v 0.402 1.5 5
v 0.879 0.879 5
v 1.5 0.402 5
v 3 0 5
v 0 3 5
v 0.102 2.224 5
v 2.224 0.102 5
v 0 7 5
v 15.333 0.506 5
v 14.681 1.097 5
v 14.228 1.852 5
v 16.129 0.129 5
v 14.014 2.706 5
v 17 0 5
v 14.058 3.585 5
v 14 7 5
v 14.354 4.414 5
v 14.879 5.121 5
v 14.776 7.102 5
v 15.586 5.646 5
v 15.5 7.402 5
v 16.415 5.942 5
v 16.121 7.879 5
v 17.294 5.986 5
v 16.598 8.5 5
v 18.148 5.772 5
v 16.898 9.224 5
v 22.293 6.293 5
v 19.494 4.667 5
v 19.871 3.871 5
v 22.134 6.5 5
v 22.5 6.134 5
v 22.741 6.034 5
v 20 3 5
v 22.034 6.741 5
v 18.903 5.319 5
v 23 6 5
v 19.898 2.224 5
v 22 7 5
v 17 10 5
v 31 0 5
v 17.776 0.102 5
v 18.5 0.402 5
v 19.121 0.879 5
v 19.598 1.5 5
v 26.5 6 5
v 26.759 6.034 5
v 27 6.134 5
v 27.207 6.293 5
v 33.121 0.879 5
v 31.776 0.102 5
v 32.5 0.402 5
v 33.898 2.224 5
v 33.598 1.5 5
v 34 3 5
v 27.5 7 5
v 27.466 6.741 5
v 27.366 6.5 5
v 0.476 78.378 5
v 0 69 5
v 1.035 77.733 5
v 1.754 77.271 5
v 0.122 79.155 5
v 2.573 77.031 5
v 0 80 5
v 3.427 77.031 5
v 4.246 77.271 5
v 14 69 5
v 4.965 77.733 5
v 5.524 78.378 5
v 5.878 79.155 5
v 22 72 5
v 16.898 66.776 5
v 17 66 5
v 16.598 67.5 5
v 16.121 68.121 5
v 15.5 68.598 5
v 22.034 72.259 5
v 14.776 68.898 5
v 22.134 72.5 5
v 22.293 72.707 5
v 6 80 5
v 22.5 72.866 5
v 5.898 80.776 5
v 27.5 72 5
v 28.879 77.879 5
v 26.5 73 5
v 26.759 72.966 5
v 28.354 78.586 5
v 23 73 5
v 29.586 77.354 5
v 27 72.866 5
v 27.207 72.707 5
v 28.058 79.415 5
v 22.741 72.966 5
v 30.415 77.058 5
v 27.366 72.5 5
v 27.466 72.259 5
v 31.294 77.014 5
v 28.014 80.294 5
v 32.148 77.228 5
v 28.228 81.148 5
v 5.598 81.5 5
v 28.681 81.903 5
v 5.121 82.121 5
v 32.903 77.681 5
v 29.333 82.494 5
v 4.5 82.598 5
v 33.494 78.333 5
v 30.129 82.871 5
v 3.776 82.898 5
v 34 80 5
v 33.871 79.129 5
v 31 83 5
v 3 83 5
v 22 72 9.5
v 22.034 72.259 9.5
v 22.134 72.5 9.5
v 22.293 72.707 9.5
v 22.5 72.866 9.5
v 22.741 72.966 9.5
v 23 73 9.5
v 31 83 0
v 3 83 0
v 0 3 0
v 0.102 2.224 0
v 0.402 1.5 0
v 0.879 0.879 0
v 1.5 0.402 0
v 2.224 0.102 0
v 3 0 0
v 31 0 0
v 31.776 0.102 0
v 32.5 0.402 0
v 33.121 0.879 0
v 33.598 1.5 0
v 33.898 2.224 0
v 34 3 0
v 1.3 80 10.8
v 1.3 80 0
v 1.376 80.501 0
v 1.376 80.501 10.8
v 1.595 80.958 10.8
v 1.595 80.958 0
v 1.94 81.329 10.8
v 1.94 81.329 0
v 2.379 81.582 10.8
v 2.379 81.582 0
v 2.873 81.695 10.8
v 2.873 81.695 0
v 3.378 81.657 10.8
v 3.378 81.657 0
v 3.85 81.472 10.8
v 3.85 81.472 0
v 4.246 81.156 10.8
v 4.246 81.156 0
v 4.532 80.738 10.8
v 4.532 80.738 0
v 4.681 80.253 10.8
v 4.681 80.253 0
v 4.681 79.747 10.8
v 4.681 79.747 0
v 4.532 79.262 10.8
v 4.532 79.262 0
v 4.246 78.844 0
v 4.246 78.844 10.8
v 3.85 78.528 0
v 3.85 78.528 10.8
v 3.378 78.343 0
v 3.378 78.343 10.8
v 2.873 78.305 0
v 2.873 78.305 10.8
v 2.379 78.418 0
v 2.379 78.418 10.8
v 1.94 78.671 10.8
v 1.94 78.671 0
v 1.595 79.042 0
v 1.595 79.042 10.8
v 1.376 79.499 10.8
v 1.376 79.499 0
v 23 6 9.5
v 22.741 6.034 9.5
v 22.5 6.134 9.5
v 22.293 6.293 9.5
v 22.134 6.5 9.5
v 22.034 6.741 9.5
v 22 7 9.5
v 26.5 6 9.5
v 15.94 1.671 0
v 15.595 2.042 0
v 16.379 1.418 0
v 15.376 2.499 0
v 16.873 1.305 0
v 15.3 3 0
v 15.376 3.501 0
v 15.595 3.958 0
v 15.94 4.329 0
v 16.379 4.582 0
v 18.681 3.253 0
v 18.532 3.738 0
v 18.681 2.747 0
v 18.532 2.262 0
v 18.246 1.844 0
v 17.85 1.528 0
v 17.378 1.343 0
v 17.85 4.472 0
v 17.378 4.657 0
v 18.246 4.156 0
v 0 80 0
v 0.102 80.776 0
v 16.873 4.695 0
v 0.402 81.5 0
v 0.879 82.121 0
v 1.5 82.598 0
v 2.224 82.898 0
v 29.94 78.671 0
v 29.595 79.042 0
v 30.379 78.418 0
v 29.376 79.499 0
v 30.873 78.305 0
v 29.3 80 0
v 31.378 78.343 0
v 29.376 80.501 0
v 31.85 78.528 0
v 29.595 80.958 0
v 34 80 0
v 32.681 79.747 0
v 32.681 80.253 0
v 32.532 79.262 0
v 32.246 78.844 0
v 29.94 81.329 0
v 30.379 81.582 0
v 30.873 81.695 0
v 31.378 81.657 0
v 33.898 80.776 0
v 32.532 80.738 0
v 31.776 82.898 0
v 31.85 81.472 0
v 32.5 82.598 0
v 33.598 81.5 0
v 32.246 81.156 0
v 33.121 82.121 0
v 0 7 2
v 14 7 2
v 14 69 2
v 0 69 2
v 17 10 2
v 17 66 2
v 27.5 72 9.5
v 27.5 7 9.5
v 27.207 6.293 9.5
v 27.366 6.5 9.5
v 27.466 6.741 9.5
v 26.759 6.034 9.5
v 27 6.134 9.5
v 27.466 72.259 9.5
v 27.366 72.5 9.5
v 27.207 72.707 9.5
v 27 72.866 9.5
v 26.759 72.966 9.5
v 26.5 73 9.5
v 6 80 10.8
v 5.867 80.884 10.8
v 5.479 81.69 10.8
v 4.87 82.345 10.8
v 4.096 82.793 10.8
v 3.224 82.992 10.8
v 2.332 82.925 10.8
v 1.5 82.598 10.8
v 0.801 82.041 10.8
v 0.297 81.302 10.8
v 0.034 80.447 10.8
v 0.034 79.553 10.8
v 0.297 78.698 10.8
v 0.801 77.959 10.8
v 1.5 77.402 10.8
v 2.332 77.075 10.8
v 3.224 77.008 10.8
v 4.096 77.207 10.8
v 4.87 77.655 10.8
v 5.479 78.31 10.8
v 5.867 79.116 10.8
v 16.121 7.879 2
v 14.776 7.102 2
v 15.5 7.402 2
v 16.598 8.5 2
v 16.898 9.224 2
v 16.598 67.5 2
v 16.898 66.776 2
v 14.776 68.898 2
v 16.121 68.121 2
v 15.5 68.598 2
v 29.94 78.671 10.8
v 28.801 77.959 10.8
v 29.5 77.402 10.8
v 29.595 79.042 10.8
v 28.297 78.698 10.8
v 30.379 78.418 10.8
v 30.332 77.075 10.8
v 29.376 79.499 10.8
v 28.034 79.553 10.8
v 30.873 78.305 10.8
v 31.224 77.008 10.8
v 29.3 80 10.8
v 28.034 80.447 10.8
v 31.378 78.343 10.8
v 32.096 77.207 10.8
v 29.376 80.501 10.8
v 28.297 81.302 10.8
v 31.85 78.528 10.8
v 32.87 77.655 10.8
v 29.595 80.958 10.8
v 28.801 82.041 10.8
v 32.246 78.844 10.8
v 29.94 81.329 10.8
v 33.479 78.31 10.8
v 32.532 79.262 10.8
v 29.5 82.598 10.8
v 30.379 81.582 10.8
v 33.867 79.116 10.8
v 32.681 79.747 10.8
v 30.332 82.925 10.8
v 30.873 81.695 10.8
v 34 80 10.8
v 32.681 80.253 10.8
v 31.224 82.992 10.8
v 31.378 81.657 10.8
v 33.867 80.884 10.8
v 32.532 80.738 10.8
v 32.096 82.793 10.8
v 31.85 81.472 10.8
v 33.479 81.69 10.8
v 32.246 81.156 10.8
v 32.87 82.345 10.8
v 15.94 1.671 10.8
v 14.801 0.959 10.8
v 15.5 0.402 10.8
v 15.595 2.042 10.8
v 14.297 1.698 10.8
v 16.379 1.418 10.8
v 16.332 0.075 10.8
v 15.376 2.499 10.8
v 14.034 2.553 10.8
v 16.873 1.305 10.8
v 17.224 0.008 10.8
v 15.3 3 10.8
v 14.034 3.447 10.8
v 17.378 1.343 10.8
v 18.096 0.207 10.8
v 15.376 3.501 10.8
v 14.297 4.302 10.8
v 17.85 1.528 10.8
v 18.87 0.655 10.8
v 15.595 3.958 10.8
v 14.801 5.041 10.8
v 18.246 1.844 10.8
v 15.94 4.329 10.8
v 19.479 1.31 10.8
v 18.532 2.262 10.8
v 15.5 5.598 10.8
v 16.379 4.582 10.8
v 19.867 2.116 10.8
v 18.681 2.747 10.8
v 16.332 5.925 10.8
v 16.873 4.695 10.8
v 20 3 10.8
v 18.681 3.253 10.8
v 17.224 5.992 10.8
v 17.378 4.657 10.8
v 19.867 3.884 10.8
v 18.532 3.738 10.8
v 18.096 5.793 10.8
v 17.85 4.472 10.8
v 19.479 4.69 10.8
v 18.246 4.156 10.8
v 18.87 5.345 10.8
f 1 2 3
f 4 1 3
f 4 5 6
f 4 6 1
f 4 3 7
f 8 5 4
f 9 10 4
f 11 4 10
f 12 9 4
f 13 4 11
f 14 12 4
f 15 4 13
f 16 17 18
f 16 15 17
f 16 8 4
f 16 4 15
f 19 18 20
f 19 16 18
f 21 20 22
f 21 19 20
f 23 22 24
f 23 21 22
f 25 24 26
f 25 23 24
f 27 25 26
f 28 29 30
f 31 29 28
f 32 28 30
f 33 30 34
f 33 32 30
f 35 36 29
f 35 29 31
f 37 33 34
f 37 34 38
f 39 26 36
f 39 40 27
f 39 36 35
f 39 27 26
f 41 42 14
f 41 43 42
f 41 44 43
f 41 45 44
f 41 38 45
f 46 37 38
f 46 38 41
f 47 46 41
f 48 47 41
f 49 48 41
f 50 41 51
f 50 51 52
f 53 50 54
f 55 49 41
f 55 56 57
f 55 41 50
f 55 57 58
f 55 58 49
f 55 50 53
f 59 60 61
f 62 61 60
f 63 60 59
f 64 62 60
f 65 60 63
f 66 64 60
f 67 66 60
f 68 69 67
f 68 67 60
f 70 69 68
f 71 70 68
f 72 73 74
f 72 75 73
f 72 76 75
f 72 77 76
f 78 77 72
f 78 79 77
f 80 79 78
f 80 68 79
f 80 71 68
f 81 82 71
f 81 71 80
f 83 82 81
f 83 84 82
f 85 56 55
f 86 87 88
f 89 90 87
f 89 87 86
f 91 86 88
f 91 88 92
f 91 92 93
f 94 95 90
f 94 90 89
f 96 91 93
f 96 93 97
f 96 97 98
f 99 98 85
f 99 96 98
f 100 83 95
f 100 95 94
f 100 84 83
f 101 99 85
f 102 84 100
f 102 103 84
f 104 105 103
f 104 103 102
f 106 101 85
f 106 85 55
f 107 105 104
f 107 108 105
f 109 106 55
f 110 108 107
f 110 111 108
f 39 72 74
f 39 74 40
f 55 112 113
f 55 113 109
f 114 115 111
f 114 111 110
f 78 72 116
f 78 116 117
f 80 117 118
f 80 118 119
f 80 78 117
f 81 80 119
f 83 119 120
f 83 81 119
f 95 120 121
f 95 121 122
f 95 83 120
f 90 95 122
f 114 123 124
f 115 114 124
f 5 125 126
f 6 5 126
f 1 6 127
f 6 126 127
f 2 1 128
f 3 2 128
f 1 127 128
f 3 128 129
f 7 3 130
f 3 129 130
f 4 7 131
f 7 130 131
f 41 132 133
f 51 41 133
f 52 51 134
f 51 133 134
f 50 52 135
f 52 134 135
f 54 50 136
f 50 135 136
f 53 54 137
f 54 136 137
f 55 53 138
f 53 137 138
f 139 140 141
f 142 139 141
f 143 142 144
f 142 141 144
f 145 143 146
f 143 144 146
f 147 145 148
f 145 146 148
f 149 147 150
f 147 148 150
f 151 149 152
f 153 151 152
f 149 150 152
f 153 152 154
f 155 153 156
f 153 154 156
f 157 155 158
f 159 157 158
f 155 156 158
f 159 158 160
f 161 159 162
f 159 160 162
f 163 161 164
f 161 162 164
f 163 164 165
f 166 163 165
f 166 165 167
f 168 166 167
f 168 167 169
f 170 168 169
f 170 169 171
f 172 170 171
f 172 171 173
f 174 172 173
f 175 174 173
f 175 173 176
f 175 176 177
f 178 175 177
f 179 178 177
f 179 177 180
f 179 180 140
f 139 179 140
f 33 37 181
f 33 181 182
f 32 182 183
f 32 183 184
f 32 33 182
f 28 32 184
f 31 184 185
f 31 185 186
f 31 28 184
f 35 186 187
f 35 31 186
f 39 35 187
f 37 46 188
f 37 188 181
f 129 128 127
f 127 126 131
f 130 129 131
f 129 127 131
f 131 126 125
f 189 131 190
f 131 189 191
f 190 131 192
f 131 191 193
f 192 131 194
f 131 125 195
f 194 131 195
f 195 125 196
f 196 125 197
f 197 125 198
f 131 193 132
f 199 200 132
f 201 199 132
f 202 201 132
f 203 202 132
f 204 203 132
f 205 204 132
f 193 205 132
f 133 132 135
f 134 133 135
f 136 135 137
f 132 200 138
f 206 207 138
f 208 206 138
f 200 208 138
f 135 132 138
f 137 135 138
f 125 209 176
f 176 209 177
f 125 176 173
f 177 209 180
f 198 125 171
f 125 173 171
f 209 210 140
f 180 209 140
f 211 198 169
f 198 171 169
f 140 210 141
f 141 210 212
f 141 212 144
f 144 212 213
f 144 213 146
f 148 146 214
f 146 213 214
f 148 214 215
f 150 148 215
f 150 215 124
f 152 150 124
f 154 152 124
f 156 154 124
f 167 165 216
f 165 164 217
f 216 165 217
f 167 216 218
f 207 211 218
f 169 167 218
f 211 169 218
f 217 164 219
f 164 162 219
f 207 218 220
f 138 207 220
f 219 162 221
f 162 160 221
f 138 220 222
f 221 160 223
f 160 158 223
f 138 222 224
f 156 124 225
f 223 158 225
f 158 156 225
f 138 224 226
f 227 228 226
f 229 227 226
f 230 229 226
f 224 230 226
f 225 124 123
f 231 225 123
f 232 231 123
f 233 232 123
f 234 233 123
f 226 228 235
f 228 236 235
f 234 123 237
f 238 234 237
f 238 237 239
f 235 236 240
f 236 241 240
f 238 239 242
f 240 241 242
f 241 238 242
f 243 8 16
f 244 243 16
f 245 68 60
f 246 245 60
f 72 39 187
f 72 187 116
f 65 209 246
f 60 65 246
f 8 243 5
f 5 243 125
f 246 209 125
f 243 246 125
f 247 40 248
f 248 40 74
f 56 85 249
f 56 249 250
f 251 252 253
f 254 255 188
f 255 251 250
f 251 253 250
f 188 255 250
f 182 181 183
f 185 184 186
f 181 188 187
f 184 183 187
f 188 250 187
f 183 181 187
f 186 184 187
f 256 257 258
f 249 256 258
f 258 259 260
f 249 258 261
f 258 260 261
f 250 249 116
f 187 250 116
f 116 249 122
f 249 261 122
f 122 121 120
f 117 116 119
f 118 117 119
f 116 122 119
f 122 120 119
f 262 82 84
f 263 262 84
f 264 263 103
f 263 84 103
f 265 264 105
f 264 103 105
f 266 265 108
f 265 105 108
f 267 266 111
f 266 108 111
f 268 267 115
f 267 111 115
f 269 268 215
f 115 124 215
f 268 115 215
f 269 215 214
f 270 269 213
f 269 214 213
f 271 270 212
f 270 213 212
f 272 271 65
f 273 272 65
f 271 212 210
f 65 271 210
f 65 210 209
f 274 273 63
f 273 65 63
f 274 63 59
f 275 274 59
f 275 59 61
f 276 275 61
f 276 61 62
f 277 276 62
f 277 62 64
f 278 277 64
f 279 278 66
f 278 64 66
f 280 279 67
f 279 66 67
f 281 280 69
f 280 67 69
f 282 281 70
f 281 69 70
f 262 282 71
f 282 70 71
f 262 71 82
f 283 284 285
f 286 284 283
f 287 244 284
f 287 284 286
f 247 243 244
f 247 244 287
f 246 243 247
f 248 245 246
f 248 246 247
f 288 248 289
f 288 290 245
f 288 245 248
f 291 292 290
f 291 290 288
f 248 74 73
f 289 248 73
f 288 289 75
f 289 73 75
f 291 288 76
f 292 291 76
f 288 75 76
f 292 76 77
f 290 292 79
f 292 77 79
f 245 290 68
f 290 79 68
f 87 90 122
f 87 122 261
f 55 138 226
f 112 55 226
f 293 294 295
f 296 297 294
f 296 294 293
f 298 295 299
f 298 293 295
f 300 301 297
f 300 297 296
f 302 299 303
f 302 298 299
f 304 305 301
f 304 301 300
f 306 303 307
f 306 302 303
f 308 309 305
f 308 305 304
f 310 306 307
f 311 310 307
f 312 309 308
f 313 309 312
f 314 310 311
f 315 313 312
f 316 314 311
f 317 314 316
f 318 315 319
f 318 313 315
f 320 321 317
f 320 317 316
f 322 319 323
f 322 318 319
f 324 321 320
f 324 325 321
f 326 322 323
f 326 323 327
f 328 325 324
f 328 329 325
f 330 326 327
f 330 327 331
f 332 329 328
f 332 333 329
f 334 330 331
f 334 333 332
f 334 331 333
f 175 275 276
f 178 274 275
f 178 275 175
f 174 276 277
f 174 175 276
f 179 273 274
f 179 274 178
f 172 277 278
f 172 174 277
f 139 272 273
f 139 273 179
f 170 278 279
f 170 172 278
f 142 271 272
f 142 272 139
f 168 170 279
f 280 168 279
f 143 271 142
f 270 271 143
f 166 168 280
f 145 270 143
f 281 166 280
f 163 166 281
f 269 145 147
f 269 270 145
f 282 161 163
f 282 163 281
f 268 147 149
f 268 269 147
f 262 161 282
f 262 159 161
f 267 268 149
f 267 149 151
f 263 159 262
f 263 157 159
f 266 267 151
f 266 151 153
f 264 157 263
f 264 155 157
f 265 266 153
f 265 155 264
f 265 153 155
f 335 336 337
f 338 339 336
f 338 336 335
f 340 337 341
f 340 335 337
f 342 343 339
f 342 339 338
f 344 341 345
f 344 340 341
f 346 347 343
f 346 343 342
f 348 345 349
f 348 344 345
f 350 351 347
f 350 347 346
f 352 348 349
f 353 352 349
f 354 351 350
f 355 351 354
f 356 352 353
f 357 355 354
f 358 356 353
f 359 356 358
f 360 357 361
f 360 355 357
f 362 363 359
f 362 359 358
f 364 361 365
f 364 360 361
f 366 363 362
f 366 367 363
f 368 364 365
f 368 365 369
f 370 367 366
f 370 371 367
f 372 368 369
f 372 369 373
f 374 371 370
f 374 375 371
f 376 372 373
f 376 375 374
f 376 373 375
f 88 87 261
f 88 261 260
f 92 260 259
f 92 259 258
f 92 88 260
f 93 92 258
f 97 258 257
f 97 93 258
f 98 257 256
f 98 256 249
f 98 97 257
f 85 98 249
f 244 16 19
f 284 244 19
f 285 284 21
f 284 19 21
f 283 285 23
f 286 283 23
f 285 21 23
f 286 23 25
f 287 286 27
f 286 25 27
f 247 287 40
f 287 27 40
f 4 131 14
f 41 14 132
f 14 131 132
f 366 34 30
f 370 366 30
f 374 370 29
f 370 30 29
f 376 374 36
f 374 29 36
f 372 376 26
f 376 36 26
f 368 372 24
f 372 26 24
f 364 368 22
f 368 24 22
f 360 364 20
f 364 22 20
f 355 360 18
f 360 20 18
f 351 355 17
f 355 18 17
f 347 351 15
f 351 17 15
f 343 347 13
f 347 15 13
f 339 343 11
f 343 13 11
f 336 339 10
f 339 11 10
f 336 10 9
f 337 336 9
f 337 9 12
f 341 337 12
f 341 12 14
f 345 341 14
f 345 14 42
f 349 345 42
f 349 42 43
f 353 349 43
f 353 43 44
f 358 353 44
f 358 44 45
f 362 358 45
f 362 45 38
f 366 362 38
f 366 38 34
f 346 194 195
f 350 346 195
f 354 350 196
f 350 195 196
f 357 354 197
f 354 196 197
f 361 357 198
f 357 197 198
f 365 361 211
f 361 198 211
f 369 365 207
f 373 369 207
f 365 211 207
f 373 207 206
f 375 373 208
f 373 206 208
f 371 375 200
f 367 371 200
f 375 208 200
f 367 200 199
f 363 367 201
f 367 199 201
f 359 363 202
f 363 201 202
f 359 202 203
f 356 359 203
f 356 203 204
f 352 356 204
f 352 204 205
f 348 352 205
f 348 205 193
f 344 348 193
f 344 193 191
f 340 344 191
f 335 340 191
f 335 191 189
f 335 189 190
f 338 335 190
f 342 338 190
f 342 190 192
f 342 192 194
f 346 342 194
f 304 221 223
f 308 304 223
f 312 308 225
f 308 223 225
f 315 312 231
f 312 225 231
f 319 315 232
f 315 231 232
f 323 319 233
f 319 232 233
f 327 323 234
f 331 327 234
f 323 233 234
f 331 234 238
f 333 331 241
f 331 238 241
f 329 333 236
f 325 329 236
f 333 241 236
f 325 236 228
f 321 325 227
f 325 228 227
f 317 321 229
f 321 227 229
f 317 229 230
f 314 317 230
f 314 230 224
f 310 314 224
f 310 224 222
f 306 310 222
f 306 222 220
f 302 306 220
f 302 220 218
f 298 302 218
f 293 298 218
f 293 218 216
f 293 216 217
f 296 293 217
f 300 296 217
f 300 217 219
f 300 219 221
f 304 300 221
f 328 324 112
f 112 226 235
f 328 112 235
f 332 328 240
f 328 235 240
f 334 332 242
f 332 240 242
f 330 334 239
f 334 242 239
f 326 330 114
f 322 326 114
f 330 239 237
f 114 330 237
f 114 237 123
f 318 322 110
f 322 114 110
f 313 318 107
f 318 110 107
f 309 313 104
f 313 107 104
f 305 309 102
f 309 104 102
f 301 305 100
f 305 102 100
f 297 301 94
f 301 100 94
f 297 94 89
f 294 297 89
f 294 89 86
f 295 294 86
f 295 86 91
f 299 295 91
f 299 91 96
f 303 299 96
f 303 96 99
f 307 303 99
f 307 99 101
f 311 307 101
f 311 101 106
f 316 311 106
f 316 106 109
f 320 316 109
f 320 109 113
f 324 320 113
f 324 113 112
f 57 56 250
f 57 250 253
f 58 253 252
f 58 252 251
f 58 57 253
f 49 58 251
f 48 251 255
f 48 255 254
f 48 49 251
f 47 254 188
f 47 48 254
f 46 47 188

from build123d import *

# Parameters (mm, degrees)
BOSS_EXTRU_2_DEPTH      = 5
ESQUISSE4_R             = 3
BOSS_EXTRU_3_DEPTH      = 5.8
D_GAGEMENT_M31_D        = 3.4
BOSS_EXTRU_4_DEPTH      = 4.5
ENL_V_MAT_EXTRU_1_DEPTH = 3


with BuildPart() as part:
    # Esquisse1 → Boss.-Extru.2 (new body)
    with BuildSketch(Plane.XY):
        with BuildLine():
            Line((3, 0), (31, 0))
            ThreePointArc((31, 0), (33.121320344, 0.878679656), (34, 3))
            Line((34, 3), (34, 80))
            ThreePointArc((34, 80), (33.121320344, 82.121320344), (31, 83))
            Line((31, 83), (3, 83))
            ThreePointArc((3, 83), (0.878679656, 82.121320344), (0, 80))
            Line((0, 80), (0, 3))
            ThreePointArc((0, 3), (0.878679656, 0.878679656), (3, 0))
        make_face()
    extrude(amount=BOSS_EXTRU_2_DEPTH)

    # Esquisse4 → Boss.-Extru.3 (add)
    with BuildSketch(Plane.XY.offset(5)):
        with Locations((3, 80)):
            Circle(ESQUISSE4_R)
        with Locations((31, 80)):
            Circle(ESQUISSE4_R)
        with Locations((17, 3)):
            Circle(ESQUISSE4_R)
    extrude(amount=BOSS_EXTRU_3_DEPTH)

    # Dégagement M31 (through all)
    with Locations(Plane.XY.offset(10.8)):
        with Locations((3, 80), (31, 80), (17, 3)):
            Hole(D_GAGEMENT_M31_D / 2)

    # Esquisse2 → Boss.-Extru.4 (add)
    with BuildSketch(Plane.XY.offset(5)):
        with BuildLine():
            Line((23, 73), (26.5, 73))
            ThreePointArc((26.5, 73), (27.207106781, 72.707106781), (27.5, 72))
            Line((27.5, 72), (27.5, 7))
            ThreePointArc((27.5, 7), (27.207106781, 6.292893219), (26.5, 6))
            Line((26.5, 6), (23, 6))
            ThreePointArc((23, 6), (22.292893219, 6.292893219), (22, 7))
            Line((22, 7), (22, 72))
            ThreePointArc((22, 72), (22.292893219, 72.707106781), (23, 73))
        make_face()
    extrude(amount=BOSS_EXTRU_4_DEPTH)

    # Esquisse7 → Enlèv. mat.-Extru.1 (cut)
    with BuildSketch(Plane.XY.offset(5)):
        with BuildLine():
            Line((14, 69), (0, 69))
            Line((0, 69), (0, 7))
            Line((0, 7), (14, 7))
            ThreePointArc((14, 7), (16.121320344, 7.878679656), (17, 10))
            Line((17, 10), (17, 66))
            ThreePointArc((17, 66), (16.121320344, 68.121320344), (14, 69))
        make_face()
    extrude(amount=-ENL_V_MAT_EXTRU_1_DEPTH, mode=Mode.SUBTRACT)


solid = part.part
